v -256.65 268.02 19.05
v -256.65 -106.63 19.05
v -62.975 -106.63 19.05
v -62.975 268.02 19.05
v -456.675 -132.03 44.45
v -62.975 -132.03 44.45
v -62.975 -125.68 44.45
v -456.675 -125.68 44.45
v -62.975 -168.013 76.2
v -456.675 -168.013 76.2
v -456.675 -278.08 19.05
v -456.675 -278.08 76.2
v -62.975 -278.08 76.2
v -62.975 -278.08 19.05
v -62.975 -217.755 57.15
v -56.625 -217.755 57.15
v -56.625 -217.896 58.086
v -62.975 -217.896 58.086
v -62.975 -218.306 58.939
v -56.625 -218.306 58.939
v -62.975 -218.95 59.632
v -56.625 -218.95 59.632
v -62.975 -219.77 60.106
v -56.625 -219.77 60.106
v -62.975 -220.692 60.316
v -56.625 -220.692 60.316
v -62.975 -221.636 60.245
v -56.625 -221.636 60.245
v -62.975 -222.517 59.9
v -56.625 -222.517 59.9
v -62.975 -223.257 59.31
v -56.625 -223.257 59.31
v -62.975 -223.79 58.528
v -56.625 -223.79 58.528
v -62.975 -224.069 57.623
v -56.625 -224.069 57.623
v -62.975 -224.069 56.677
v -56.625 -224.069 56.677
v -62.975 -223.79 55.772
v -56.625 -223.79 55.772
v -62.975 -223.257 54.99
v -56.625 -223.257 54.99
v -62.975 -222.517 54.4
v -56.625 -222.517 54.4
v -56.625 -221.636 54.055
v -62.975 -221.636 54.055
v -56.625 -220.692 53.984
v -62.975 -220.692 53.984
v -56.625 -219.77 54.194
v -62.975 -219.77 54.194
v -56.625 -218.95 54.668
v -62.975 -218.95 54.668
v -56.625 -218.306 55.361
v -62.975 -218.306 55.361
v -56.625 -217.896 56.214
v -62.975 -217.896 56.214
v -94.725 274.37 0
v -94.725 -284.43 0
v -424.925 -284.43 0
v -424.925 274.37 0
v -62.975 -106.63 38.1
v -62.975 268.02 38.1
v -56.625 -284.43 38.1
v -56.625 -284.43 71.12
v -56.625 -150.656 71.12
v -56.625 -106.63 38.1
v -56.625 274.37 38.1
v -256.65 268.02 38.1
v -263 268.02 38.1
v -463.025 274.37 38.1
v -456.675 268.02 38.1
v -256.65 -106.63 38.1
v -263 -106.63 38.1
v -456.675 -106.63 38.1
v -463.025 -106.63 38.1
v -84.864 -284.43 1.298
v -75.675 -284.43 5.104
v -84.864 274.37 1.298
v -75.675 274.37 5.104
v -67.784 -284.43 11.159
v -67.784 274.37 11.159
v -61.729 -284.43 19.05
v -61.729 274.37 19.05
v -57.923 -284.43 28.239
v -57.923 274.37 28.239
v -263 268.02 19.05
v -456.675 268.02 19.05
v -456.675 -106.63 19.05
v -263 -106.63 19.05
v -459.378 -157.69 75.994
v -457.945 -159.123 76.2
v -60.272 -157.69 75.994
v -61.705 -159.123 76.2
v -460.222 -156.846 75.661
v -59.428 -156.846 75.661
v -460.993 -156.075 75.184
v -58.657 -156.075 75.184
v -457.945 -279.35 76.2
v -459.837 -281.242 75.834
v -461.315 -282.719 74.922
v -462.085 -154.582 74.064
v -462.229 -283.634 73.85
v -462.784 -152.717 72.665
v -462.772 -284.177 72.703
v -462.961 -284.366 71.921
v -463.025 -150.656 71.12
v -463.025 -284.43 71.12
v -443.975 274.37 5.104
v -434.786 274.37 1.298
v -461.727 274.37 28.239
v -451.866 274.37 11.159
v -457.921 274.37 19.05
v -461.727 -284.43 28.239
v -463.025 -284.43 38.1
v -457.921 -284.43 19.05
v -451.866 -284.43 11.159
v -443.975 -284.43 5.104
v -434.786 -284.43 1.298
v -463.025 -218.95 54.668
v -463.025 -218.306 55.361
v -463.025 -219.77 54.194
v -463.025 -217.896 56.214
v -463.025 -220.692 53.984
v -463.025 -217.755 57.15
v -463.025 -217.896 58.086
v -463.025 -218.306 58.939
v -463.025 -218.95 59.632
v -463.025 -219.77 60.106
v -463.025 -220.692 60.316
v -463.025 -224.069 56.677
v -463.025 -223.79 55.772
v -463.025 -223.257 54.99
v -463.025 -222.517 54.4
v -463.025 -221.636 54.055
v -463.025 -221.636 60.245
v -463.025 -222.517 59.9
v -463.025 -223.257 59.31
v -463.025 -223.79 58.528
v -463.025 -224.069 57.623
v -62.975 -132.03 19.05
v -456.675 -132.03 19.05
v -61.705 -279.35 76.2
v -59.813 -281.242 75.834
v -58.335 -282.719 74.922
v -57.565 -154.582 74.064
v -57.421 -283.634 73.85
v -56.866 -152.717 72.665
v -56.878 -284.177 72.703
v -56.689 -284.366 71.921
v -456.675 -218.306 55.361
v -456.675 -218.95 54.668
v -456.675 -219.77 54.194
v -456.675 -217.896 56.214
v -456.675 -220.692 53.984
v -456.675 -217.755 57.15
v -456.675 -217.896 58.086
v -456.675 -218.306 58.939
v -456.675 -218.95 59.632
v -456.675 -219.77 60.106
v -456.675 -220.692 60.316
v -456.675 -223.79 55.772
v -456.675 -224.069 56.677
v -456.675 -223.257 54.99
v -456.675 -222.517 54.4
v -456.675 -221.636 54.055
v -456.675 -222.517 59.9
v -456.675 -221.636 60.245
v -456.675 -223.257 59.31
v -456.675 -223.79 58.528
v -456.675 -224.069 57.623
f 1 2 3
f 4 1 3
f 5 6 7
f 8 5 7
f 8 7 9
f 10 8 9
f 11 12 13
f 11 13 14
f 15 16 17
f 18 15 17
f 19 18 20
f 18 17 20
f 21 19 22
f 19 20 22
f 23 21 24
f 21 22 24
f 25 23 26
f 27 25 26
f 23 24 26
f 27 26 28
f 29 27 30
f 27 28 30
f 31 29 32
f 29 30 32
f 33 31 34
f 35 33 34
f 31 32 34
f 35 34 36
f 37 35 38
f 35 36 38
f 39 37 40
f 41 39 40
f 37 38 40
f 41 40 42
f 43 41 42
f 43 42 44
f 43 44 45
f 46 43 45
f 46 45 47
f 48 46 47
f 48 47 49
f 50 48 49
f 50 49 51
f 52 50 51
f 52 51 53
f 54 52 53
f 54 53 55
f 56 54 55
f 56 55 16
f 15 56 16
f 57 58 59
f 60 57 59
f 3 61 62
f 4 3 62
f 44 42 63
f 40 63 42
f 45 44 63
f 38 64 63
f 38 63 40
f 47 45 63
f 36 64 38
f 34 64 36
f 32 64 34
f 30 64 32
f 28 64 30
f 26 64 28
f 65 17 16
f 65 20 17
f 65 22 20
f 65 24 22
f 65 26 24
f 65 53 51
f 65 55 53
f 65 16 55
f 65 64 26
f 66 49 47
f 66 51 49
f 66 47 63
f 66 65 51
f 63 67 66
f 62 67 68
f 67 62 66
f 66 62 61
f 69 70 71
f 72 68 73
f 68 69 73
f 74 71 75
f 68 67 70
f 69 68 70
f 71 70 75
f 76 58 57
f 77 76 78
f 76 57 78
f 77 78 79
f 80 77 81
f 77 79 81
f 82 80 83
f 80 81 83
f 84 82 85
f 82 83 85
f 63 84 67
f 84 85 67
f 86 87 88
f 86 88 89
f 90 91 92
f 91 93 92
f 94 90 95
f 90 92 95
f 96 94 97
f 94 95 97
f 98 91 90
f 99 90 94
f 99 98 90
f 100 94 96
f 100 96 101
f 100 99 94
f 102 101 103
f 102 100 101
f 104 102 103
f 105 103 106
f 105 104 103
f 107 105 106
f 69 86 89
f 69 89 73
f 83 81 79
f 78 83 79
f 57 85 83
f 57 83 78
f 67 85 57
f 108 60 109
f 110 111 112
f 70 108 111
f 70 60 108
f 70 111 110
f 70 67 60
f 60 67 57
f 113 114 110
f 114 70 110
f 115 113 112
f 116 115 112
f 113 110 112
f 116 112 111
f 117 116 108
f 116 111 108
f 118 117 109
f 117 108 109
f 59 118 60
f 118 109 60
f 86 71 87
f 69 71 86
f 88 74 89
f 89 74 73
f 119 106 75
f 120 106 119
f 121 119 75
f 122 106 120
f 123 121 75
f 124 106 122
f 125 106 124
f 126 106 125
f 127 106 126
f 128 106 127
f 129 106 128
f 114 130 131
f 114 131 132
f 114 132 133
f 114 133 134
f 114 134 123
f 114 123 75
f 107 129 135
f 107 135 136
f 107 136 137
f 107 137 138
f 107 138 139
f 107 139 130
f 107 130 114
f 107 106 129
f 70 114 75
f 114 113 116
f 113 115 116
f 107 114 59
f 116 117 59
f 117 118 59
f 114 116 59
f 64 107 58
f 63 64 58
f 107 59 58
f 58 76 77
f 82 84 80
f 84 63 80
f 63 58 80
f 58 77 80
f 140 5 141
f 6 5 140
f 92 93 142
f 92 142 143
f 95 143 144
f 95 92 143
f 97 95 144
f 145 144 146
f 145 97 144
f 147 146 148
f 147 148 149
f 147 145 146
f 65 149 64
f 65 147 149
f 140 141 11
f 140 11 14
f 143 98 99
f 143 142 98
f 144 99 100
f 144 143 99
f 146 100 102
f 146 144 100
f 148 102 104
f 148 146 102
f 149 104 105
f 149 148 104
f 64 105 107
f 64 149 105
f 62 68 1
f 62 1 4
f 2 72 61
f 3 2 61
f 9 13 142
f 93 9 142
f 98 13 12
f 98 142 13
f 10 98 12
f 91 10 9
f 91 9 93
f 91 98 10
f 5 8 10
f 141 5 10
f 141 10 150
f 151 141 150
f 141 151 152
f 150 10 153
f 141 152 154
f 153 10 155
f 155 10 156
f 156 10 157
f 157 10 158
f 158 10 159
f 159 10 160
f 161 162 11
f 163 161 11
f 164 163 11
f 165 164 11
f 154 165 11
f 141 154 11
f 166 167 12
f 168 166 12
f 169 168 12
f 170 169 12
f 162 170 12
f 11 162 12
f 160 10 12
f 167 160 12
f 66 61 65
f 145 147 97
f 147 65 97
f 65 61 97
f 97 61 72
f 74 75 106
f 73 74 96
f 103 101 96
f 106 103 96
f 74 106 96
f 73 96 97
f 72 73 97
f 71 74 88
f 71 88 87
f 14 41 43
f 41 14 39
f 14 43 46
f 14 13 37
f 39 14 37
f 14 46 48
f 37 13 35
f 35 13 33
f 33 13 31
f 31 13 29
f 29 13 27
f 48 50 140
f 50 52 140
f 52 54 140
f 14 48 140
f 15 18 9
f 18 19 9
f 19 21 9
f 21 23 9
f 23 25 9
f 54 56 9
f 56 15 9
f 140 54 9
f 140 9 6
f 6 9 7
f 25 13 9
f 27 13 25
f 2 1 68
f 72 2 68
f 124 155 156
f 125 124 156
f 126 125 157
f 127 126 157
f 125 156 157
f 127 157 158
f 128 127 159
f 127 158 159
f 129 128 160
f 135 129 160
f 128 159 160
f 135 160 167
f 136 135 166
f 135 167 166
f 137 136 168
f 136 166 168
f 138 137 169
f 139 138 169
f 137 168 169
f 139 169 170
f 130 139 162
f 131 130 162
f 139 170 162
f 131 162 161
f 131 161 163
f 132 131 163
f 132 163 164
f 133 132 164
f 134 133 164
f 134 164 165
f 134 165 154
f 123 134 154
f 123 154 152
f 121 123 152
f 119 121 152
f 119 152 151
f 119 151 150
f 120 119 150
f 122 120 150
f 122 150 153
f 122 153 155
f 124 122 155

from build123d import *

# Parameters (mm, degrees)
F0_W          = 406.4
F0_H          = 558.8
F1_DEPTH      = 76.2
F3_DEPTH      = 406.4
F4_R          = 38.09999
F5_W          = 393.7
F5_H          = 374.65
F6_DEPTH      = 19.05
F8_DEPTH      = 406.4
F8_DEPTH_BACK = 6.35
F9_W          = 393.7
F9_H          = 146.05
F10_DEPTH     = 25.4
F12_DEPTH     = 6.35
F14_DEPTH     = 6.35
F15_R         = 3.175
F16_DEPTH     = 406.401
F17_R         = 5.08
F18_W         = 6.35
F18_H         = 38.1
F19_DEPTH     = 381


# Not quite as in the source:
# - a fillet or chamfer is up to 0.001 mm smaller than in the source, because OpenCascade refuses the exact size


with BuildPart() as f1:
    # F0 (on Top) → F1 (new body)
    with BuildSketch(Plane.XY):
        with Locations((-259.8249833828, -5.0296476896)):
            Rectangle(F0_W, F0_H)
    extrude(amount=F1_DEPTH)

    # F2 (on face) → F3 (cut)
    with BuildSketch(Plane(origin=(-463.0249833828, 0, 0), x_dir=(0, -1, 0), z_dir=(-1, 0, 0))):
        Polygon((5.0296476896, 76.2), (-147.3703523104, 76.2), (-96.5703523104, 38.1), (5.0296476896, 38.1), align=None)
        Polygon((157.4296476896, 76.2), (5.0296476896, 76.2), (5.0296476896, 38.1), (106.6296476896, 38.1), align=None)
        Polygon((-147.3703523104, 76.2), (-274.3703523104, 76.2), (-274.3703523104, 38.1), (-96.5703523104, 38.1), align=None)
    extrude(amount=-F3_DEPTH, mode=Mode.SUBTRACT)

    # F4 (radius 38.1 in the source; OpenCascade refuses exactly that, so slightly less here)
    f4_edges = [f1.edges().sort_by_distance(p)[0] for p in [
        (-56.624983, -5.029648, 0),
        (-463.024983, -5.029648, 0),
    ]]
    fillet(f4_edges, radius=F4_R)

    # F5 (on face) → F6 (cut)
    with BuildSketch(Plane.XY.offset(38.1)):
        with Locations((-259.8249833828, 80.6953523104)):
            Rectangle(F5_W, F5_H)
    extrude(amount=-F6_DEPTH, mode=Mode.SUBTRACT)

    # F7 (on face) → F8 (cut, two sides)
    with BuildSketch(Plane.YZ.offset(-56.6249833828)) as f8_sk:
        Polygon((-278.0796476896, 76.2), (-278.0796476896, 44.45), (-125.6796476896, 44.45), (-168.012981023, 76.2), align=None)
    extrude(amount=-F8_DEPTH, mode=Mode.SUBTRACT)
    extrude(f8_sk.sketch, amount=F8_DEPTH_BACK, mode=Mode.SUBTRACT)

    # F9 (on face) → F10 (cut)
    with BuildSketch(Plane.XY.offset(44.45)):
        with Locations((-259.8249833828, -205.0546476896)):
            Rectangle(F9_W, F9_H)
    extrude(amount=-F10_DEPTH, mode=Mode.SUBTRACT)

    # F11 (on face) → F12 (join)
    with BuildSketch(Plane.YZ.offset(-56.6249833828)):
        Polygon((-168.012981023, 76.2), (-278.0796476896, 76.2), (-278.0796476896, 44.45), (-125.6796476896, 44.45), align=None)
    extrude(amount=-F12_DEPTH)

    # F13 (on face) → F14 (join)
    with BuildSketch(Plane(origin=(-463.0249833828, 0, 0), x_dir=(0, -1, 0), z_dir=(-1, 0, 0))):
        Polygon((168.012981023, 76.2), (125.6796476896, 44.45), (278.0796476896, 44.45), (278.0796476896, 76.2), align=None)
    extrude(amount=-F14_DEPTH)

    # F15 (on face) → F16 (cut, through all)
    with BuildSketch(Plane.YZ.offset(-56.6249833828)):
        with Locations((-220.9296476896, 57.15)):
            Circle(F15_R)
    extrude(amount=-F16_DEPTH, mode=Mode.SUBTRACT)

    # F17
    f17_edges = [f1.edges().sort_by_distance(p)[0] for p in [
        (-463.024983, -220.929648, 76.2),
        (-259.824983, -157.429648, 76.2),
        (-259.824983, -284.429648, 76.2),
        (-56.624983, -220.929648, 76.2),
    ]]
    fillet(f17_edges, radius=F17_R)

    # F18 (on face) → F19 (join, through all)
    with BuildSketch(Plane(origin=(0, 274.3703523104, 0), x_dir=(-1, 0, 0), z_dir=(0, 1, 0))):
        with Locations((259.8249833828, 19.05)):
            Rectangle(F18_W, F18_H)
    extrude(amount=-F19_DEPTH)


solid = f1.part
